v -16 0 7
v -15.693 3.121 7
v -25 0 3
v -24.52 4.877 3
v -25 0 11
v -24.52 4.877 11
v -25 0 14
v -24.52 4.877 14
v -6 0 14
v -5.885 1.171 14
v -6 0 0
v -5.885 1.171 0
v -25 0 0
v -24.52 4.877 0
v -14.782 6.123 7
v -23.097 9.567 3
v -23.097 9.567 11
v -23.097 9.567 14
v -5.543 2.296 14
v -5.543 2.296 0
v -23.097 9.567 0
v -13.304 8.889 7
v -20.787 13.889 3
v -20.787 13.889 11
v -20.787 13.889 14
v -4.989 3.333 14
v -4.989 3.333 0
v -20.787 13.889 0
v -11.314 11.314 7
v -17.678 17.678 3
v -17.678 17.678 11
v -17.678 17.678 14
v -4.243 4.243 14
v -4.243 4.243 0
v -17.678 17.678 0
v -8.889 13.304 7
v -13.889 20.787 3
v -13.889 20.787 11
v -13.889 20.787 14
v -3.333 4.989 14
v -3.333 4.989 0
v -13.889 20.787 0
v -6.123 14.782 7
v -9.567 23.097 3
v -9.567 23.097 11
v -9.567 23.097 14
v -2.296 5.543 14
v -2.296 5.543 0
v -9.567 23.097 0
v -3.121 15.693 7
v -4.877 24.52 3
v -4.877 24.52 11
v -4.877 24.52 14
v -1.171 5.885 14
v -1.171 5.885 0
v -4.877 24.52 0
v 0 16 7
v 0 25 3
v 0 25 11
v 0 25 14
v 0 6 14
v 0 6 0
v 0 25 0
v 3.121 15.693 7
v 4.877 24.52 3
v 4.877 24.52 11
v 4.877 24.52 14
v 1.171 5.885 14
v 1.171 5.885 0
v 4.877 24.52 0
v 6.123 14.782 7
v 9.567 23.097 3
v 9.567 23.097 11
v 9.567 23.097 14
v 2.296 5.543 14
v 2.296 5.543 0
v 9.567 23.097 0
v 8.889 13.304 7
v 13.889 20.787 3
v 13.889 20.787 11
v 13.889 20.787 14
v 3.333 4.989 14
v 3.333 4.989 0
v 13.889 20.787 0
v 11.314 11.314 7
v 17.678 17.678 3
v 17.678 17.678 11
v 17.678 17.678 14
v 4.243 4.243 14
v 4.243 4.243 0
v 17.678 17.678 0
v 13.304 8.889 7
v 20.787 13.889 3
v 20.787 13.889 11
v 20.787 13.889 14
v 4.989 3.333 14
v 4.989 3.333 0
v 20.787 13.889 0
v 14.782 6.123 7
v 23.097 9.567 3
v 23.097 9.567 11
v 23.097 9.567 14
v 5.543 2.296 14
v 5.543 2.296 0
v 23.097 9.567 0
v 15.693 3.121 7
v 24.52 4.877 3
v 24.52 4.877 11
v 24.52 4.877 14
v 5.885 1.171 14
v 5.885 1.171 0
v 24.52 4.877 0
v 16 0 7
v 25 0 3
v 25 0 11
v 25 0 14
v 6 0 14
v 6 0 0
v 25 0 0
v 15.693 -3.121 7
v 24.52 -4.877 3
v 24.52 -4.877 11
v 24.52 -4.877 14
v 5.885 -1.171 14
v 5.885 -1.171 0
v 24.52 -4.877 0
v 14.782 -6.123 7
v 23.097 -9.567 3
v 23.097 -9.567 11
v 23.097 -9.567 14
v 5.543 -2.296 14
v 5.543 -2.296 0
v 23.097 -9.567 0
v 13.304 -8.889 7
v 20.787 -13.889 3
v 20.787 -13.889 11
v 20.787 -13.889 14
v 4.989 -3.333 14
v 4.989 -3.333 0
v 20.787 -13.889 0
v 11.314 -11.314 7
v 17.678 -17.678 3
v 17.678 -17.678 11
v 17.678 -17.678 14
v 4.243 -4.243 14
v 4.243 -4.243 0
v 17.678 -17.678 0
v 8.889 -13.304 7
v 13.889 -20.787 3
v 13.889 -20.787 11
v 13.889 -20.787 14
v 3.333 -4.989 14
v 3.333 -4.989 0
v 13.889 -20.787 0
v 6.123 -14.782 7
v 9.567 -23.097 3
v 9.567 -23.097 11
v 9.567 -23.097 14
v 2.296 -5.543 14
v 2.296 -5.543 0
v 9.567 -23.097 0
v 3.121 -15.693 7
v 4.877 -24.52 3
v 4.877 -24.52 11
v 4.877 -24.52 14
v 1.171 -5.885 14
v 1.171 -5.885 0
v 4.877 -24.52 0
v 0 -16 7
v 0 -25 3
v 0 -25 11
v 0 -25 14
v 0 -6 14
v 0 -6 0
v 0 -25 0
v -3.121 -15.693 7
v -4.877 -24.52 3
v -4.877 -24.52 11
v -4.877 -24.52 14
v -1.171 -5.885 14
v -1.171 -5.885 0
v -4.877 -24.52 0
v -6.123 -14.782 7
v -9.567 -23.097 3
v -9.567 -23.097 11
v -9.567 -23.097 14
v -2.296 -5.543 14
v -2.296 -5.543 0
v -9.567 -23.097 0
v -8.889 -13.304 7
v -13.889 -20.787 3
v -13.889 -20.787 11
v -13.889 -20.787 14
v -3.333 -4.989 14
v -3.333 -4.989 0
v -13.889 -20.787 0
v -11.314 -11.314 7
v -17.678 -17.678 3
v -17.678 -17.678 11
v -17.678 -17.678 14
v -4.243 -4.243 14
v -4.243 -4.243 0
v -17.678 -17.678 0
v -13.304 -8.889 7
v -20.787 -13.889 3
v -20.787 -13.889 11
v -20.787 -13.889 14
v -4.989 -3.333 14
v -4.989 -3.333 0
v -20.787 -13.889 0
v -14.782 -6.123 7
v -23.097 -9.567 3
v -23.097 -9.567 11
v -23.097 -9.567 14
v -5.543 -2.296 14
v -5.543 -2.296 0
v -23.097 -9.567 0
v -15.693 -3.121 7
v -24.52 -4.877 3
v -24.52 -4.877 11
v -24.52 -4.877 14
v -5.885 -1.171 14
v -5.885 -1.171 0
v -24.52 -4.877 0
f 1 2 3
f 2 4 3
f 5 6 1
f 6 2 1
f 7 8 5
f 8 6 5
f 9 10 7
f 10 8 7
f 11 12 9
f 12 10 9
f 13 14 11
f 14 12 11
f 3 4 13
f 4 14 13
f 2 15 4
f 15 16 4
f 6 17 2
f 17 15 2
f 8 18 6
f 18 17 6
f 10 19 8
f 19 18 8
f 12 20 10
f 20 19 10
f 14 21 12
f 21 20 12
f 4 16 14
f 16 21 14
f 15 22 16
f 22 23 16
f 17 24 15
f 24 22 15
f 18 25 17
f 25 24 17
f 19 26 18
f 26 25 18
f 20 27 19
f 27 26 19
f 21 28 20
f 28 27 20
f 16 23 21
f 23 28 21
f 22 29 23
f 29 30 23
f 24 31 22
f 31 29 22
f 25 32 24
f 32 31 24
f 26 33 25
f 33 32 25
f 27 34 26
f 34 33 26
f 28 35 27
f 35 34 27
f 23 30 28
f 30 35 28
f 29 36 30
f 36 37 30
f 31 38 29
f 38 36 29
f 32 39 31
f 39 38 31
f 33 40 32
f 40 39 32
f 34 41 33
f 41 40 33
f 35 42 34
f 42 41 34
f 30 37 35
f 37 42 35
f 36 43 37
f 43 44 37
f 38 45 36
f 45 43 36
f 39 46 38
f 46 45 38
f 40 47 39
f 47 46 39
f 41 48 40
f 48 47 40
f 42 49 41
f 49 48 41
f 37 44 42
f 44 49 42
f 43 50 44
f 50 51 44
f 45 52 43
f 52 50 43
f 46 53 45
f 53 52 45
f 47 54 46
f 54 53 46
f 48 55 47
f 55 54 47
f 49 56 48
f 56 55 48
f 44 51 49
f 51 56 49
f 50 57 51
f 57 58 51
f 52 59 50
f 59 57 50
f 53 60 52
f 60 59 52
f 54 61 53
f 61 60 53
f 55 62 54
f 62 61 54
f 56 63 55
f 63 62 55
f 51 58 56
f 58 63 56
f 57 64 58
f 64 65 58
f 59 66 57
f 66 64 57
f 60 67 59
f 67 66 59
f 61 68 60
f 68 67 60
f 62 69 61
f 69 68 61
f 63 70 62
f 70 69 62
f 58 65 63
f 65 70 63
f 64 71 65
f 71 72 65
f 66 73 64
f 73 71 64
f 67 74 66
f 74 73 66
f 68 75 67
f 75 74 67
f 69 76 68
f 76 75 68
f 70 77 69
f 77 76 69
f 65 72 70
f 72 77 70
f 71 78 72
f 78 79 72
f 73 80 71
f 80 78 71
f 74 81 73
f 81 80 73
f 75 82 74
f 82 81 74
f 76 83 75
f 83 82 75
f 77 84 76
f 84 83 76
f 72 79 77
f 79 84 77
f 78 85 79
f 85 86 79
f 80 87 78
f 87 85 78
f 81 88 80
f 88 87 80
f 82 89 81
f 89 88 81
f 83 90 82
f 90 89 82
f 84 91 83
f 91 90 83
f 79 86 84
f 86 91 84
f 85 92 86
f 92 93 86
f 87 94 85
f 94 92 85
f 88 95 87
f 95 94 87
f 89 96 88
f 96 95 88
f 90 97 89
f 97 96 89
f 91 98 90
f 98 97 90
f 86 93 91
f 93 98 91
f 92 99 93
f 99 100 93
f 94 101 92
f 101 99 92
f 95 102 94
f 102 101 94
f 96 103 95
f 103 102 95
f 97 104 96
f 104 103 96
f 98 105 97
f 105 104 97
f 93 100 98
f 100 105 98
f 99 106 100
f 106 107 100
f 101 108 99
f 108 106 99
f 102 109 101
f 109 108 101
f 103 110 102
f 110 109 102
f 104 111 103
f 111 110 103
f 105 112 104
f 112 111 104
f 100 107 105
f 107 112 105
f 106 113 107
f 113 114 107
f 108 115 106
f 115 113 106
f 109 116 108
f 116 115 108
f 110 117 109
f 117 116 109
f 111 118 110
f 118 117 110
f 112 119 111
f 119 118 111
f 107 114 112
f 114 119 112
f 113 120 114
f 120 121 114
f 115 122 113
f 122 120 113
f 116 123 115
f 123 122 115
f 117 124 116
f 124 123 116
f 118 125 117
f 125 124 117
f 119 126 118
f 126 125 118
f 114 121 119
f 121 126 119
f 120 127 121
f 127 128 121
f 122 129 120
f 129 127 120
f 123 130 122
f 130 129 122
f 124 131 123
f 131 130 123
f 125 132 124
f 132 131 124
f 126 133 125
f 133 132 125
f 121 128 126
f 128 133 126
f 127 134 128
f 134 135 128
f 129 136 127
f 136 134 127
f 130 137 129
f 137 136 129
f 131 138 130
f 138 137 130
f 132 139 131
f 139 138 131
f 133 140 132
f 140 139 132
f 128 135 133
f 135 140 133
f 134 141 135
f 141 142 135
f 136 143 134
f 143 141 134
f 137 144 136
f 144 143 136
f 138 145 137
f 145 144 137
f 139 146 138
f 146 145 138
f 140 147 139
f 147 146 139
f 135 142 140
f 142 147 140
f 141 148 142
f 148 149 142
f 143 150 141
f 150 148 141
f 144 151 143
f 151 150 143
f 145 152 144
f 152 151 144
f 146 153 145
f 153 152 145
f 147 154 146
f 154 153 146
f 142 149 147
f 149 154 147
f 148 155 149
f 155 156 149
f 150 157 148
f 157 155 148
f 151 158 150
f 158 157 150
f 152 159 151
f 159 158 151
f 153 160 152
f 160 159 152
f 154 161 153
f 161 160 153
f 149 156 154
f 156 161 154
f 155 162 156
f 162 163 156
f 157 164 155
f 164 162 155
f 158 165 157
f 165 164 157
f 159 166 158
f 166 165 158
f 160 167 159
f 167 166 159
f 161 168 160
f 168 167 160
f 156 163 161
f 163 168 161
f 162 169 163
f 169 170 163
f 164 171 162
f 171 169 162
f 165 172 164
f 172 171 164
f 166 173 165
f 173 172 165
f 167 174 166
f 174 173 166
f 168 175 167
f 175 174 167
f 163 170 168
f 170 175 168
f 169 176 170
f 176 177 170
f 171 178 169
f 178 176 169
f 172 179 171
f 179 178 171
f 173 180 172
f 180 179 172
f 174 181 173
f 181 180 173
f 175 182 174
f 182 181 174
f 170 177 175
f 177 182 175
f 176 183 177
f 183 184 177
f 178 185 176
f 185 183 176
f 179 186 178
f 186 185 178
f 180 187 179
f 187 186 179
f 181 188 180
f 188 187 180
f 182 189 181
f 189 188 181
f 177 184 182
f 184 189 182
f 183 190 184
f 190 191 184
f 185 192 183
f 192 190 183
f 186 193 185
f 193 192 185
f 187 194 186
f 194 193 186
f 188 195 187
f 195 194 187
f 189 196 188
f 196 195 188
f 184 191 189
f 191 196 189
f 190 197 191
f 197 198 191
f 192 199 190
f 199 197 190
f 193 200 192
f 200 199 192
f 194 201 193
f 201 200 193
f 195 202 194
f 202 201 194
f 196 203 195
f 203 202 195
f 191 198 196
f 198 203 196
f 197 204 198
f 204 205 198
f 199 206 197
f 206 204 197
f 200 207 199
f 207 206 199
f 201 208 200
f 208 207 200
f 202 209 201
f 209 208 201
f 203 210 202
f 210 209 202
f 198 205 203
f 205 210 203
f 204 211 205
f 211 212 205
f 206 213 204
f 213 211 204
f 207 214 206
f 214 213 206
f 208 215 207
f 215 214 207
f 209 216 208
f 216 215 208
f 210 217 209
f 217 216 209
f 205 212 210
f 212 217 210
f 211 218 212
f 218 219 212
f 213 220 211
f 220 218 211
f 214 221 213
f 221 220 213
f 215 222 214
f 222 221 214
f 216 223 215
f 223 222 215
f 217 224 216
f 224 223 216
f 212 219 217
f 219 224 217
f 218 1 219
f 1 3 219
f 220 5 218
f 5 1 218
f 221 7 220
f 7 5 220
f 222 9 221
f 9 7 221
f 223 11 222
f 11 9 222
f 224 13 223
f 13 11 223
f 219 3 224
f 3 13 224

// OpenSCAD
$fn = 32;

// ----------------------------------------------------------------------
// Revolved part: V-groove pulley R25
// ----------------------------------------------------------------------

// --- parameters (mm) ---
bore_r = 6;               // bore radius
rim_r = 25;               // rim radius
rim_t = 14;               // rim width
groove_r = 16;            // groove root radius
groove_w = 4;             // groove half width
revolve_angle = 360;      // revolve sweep, degrees

bore_d = 2 * bore_r;
rim_d = 2 * rim_r;
groove_d = 2 * groove_r;

profile = [[6, 0], [25, 0], [25, 3], [16, 7], [25, 11], [25, 14], [6, 14]];  // primary outline, 7 points, counter clockwise

// --- the one profile operation ---
rotate_extrude(angle = revolve_angle) polygon(points = profile);
